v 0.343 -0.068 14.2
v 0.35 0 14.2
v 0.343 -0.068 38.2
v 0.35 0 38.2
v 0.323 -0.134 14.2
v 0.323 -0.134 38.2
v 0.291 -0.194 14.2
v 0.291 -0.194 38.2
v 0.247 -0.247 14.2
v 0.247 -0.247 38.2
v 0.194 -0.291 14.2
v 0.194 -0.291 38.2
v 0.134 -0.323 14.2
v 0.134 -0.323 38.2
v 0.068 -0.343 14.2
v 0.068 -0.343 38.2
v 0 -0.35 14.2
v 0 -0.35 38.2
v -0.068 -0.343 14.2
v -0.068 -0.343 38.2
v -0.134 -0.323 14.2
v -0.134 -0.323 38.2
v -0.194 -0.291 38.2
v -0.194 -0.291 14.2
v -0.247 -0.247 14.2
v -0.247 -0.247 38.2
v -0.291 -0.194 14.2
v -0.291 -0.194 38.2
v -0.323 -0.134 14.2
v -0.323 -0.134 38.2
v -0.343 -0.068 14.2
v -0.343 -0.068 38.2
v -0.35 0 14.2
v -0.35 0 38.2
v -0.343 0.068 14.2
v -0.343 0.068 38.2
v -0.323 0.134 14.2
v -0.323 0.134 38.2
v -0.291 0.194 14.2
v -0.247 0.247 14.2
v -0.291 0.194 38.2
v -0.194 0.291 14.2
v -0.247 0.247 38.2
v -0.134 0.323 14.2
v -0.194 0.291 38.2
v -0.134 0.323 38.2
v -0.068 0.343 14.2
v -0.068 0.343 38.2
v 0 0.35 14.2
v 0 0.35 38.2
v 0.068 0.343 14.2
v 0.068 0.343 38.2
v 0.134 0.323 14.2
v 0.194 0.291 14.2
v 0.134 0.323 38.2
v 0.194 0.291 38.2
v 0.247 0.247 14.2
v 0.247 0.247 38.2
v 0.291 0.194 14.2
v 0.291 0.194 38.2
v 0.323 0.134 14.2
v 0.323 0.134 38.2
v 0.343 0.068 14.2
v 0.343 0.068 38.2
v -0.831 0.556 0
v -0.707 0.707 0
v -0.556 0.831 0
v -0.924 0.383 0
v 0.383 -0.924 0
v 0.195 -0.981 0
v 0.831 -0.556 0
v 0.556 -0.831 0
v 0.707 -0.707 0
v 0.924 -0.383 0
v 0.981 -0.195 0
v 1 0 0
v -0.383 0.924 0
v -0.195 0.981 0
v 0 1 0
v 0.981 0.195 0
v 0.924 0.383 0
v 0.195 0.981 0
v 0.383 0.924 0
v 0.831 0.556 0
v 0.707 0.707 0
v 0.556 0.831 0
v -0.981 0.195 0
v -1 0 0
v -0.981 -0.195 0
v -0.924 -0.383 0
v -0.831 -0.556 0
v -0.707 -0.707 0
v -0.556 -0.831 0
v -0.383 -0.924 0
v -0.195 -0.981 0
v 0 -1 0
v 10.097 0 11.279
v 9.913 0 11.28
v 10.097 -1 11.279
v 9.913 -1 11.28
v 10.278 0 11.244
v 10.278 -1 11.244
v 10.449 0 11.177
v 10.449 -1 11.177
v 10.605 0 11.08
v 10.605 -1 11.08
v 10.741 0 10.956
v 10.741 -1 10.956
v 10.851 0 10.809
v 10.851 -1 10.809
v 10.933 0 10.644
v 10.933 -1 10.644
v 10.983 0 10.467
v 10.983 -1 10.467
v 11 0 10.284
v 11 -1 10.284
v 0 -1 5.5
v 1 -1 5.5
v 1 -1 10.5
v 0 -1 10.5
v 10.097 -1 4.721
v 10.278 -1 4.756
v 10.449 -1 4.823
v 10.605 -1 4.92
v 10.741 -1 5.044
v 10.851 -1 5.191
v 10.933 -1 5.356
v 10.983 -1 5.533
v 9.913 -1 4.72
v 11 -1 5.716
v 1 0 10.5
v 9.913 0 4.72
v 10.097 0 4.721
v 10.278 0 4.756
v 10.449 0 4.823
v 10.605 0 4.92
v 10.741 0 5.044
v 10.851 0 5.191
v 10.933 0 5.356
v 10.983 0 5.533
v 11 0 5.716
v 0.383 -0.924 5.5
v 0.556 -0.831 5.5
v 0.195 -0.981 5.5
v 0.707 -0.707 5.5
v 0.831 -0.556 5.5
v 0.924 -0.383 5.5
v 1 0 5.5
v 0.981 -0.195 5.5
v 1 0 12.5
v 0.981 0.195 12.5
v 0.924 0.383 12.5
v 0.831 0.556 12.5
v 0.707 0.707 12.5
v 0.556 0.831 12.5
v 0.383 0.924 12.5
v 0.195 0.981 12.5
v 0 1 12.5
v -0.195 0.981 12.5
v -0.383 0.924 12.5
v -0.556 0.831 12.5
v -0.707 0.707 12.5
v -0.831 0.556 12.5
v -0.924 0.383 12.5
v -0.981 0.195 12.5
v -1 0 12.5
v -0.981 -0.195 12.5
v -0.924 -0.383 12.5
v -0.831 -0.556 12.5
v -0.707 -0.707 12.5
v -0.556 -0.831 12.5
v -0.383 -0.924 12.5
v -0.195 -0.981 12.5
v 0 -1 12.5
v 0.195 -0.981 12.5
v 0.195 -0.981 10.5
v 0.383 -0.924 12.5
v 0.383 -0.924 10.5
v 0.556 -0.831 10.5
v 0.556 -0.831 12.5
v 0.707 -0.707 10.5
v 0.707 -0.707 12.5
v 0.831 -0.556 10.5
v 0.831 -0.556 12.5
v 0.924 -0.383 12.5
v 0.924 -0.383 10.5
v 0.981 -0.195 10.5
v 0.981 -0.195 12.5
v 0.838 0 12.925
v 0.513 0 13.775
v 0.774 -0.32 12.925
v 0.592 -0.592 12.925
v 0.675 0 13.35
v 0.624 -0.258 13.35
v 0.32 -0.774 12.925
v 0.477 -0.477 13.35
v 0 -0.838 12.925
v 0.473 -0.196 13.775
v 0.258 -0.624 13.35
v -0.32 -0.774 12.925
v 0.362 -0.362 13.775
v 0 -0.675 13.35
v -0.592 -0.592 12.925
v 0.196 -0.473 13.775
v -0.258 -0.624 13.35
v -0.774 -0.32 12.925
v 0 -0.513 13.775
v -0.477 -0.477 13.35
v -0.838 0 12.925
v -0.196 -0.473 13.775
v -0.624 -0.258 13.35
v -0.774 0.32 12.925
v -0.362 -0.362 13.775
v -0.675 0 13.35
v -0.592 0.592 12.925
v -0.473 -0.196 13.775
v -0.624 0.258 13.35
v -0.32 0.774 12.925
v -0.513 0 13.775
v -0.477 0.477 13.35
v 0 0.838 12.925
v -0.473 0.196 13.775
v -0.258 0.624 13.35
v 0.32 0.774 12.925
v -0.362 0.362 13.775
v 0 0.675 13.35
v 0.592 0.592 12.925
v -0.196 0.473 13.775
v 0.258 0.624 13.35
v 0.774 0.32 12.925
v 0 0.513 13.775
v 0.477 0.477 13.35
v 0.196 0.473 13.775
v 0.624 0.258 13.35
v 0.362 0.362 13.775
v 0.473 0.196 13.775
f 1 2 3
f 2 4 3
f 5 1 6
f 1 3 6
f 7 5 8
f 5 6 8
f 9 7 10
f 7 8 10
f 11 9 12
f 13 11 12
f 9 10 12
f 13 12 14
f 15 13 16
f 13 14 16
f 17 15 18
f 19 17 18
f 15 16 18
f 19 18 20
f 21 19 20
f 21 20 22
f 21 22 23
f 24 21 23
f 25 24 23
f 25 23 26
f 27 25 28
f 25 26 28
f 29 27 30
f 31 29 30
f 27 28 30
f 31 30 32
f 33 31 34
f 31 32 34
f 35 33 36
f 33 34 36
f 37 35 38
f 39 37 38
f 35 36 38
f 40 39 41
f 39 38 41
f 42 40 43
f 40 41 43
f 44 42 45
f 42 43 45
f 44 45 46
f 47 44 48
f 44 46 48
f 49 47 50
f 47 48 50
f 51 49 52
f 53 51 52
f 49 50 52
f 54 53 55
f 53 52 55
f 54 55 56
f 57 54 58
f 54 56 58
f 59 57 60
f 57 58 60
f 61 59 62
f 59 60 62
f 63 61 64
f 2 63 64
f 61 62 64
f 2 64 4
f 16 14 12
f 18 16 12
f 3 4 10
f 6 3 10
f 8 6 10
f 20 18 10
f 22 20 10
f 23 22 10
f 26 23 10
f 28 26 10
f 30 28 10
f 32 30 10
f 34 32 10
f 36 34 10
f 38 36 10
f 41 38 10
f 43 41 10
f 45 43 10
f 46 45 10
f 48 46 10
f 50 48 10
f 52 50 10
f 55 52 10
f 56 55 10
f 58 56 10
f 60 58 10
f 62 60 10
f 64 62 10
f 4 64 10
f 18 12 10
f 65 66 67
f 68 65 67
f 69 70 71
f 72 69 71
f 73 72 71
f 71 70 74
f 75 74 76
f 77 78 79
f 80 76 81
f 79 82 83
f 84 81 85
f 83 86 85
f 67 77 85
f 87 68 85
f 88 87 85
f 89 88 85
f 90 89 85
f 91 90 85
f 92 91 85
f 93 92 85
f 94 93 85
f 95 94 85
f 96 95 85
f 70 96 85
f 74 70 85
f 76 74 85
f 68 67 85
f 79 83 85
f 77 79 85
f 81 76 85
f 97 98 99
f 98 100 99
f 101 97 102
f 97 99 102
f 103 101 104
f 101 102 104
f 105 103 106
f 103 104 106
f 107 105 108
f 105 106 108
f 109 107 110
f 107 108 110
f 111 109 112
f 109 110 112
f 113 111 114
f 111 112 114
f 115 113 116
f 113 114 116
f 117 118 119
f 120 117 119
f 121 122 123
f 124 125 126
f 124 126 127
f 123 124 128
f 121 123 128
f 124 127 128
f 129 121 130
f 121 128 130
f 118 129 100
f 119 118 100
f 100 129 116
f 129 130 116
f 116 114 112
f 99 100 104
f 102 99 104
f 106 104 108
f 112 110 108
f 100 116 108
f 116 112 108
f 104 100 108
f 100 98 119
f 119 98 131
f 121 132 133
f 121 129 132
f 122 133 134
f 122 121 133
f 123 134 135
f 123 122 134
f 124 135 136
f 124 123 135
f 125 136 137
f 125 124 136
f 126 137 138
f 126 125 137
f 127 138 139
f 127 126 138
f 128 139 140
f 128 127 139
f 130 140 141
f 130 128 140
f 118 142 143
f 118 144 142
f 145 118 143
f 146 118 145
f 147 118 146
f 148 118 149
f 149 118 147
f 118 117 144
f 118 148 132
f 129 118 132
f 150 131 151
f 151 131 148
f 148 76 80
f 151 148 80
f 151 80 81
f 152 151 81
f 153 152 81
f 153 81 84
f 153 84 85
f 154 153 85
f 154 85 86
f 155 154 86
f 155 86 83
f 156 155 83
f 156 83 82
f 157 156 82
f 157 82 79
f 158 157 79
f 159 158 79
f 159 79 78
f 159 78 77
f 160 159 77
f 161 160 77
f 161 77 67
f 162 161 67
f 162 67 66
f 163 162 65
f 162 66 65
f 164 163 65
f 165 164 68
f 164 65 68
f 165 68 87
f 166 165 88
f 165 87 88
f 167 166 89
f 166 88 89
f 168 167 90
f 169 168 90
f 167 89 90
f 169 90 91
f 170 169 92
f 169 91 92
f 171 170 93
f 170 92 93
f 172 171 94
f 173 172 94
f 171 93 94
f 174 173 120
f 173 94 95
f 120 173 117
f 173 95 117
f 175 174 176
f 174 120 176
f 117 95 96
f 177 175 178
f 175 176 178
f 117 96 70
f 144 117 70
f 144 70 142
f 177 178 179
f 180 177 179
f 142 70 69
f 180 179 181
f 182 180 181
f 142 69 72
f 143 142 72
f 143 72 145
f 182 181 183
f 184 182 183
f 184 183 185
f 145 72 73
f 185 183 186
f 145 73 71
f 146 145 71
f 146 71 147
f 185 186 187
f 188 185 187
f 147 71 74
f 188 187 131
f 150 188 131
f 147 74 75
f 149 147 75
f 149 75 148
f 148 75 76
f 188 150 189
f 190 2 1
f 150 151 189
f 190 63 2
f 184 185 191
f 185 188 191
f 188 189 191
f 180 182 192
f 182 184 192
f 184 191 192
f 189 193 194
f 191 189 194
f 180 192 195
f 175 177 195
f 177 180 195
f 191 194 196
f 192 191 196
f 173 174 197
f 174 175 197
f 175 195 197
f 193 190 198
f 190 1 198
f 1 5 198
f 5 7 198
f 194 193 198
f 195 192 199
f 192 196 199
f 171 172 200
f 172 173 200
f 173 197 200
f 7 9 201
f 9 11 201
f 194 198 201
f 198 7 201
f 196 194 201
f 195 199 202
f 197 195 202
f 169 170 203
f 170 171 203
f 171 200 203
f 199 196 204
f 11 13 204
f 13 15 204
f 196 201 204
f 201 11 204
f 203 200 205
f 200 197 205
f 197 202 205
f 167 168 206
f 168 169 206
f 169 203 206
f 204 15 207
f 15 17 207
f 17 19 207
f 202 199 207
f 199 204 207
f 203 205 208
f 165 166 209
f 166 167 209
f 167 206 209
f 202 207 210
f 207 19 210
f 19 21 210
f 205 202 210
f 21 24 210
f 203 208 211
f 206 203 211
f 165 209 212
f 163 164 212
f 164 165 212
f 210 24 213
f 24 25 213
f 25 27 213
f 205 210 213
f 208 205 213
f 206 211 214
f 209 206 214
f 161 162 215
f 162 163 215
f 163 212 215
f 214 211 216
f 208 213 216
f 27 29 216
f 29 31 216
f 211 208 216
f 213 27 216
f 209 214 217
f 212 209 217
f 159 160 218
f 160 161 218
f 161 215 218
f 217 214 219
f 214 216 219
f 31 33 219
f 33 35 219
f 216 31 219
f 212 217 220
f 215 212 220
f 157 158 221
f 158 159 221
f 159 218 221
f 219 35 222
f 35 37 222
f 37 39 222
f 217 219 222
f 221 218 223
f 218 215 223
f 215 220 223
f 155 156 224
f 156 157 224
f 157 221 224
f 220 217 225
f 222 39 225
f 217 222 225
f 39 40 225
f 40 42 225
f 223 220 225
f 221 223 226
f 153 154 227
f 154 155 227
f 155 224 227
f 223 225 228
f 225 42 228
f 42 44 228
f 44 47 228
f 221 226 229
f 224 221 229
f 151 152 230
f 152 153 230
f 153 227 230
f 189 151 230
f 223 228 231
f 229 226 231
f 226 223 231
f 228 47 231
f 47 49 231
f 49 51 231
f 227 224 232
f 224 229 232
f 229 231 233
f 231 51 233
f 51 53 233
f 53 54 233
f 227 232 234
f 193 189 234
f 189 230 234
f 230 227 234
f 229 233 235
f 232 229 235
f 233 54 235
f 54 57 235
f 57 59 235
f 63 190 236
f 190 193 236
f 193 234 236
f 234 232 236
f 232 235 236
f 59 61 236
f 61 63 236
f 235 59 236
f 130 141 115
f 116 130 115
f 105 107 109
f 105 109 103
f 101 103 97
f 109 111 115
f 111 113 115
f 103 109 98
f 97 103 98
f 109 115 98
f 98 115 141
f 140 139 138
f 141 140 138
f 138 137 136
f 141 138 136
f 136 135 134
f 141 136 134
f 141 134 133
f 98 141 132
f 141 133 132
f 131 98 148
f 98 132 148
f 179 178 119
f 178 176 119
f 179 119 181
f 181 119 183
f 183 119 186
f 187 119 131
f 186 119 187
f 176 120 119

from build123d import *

# Parameters (mm, degrees)
SKETCH_1_R      = 1
EXTRUDE_1_DEPTH = 12.5
EXTRUDE_2_DEPTH = 1
EXTRUDE_3_REACH = 18.039
SKETCH_3_W      = 5
SKETCH_3_H      = 1
FILLET_1_R      = 1


with BuildPart() as part:
    # 草图1 → 凸台-拉伸1 (new body)
    with BuildSketch(Plane.XY):
        Circle(SKETCH_1_R)
    extrude(amount=EXTRUDE_1_DEPTH)

    # 草图3 → 凸台-拉伸3 (add, up to next)
    with BuildSketch(Plane.ZY.offset(-1), mode=Mode.PRIVATE) as extrude_3_sk1:
        with Locations((8, -0.5)):
            Rectangle(SKETCH_3_W, SKETCH_3_H)
    extrude_3_tool1 = extrude(extrude_3_sk1.sketch, amount=EXTRUDE_3_REACH, mode=Mode.PRIVATE) - part.part


with BuildPart() as body_2:
    # 草图2 → 凸台-拉伸2 (new body)
    with BuildSketch(Plane(origin=(0, 0, 0), x_dir=(1, 0, 0), z_dir=(0, 1, 0))):
        Polygon((1, -10.5), (1, -5.5), (11, -4.625113365), (11, -11.374886635), align=None)
    extrude(amount=-EXTRUDE_2_DEPTH)


with BuildPart() as part_1:
    add(part.part)

    add(body_2.part)  # 凸台-拉伸3 merges body 2
    add(extrude_3_tool1.solids().sort_by_distance((1, -0.5, 8))[0])

    # 草图5 → 旋转2 (revolve)
    with BuildSketch(Plane(origin=(0, 0, 0), x_dir=(1, 0, 0), z_dir=(0, 1, 0)), mode=Mode.PRIVATE) as revolve_2_sk:
        Polygon((-1, -12.5), (-0.35, -14.2), (-0.35, -38.2), (0, -38.2), (0, -14.2), (0, -12.5), align=None)
    revolve(revolve_2_sk.sketch.rotate(Axis((0, 0, 38.2), (0, 0, -1)), 180), axis=Axis((0, 0, 38.2), (0, 0, -1)))

    # 圆角1
    fillet_1_edges = [part_1.edges().sort_by_distance(p)[0] for p in [
        (11, -0.5, 11.374886635),
        (11, -0.5, 4.625113365),
    ]]
    fillet(fillet_1_edges, radius=FILLET_1_R)


solid = part_1.part
